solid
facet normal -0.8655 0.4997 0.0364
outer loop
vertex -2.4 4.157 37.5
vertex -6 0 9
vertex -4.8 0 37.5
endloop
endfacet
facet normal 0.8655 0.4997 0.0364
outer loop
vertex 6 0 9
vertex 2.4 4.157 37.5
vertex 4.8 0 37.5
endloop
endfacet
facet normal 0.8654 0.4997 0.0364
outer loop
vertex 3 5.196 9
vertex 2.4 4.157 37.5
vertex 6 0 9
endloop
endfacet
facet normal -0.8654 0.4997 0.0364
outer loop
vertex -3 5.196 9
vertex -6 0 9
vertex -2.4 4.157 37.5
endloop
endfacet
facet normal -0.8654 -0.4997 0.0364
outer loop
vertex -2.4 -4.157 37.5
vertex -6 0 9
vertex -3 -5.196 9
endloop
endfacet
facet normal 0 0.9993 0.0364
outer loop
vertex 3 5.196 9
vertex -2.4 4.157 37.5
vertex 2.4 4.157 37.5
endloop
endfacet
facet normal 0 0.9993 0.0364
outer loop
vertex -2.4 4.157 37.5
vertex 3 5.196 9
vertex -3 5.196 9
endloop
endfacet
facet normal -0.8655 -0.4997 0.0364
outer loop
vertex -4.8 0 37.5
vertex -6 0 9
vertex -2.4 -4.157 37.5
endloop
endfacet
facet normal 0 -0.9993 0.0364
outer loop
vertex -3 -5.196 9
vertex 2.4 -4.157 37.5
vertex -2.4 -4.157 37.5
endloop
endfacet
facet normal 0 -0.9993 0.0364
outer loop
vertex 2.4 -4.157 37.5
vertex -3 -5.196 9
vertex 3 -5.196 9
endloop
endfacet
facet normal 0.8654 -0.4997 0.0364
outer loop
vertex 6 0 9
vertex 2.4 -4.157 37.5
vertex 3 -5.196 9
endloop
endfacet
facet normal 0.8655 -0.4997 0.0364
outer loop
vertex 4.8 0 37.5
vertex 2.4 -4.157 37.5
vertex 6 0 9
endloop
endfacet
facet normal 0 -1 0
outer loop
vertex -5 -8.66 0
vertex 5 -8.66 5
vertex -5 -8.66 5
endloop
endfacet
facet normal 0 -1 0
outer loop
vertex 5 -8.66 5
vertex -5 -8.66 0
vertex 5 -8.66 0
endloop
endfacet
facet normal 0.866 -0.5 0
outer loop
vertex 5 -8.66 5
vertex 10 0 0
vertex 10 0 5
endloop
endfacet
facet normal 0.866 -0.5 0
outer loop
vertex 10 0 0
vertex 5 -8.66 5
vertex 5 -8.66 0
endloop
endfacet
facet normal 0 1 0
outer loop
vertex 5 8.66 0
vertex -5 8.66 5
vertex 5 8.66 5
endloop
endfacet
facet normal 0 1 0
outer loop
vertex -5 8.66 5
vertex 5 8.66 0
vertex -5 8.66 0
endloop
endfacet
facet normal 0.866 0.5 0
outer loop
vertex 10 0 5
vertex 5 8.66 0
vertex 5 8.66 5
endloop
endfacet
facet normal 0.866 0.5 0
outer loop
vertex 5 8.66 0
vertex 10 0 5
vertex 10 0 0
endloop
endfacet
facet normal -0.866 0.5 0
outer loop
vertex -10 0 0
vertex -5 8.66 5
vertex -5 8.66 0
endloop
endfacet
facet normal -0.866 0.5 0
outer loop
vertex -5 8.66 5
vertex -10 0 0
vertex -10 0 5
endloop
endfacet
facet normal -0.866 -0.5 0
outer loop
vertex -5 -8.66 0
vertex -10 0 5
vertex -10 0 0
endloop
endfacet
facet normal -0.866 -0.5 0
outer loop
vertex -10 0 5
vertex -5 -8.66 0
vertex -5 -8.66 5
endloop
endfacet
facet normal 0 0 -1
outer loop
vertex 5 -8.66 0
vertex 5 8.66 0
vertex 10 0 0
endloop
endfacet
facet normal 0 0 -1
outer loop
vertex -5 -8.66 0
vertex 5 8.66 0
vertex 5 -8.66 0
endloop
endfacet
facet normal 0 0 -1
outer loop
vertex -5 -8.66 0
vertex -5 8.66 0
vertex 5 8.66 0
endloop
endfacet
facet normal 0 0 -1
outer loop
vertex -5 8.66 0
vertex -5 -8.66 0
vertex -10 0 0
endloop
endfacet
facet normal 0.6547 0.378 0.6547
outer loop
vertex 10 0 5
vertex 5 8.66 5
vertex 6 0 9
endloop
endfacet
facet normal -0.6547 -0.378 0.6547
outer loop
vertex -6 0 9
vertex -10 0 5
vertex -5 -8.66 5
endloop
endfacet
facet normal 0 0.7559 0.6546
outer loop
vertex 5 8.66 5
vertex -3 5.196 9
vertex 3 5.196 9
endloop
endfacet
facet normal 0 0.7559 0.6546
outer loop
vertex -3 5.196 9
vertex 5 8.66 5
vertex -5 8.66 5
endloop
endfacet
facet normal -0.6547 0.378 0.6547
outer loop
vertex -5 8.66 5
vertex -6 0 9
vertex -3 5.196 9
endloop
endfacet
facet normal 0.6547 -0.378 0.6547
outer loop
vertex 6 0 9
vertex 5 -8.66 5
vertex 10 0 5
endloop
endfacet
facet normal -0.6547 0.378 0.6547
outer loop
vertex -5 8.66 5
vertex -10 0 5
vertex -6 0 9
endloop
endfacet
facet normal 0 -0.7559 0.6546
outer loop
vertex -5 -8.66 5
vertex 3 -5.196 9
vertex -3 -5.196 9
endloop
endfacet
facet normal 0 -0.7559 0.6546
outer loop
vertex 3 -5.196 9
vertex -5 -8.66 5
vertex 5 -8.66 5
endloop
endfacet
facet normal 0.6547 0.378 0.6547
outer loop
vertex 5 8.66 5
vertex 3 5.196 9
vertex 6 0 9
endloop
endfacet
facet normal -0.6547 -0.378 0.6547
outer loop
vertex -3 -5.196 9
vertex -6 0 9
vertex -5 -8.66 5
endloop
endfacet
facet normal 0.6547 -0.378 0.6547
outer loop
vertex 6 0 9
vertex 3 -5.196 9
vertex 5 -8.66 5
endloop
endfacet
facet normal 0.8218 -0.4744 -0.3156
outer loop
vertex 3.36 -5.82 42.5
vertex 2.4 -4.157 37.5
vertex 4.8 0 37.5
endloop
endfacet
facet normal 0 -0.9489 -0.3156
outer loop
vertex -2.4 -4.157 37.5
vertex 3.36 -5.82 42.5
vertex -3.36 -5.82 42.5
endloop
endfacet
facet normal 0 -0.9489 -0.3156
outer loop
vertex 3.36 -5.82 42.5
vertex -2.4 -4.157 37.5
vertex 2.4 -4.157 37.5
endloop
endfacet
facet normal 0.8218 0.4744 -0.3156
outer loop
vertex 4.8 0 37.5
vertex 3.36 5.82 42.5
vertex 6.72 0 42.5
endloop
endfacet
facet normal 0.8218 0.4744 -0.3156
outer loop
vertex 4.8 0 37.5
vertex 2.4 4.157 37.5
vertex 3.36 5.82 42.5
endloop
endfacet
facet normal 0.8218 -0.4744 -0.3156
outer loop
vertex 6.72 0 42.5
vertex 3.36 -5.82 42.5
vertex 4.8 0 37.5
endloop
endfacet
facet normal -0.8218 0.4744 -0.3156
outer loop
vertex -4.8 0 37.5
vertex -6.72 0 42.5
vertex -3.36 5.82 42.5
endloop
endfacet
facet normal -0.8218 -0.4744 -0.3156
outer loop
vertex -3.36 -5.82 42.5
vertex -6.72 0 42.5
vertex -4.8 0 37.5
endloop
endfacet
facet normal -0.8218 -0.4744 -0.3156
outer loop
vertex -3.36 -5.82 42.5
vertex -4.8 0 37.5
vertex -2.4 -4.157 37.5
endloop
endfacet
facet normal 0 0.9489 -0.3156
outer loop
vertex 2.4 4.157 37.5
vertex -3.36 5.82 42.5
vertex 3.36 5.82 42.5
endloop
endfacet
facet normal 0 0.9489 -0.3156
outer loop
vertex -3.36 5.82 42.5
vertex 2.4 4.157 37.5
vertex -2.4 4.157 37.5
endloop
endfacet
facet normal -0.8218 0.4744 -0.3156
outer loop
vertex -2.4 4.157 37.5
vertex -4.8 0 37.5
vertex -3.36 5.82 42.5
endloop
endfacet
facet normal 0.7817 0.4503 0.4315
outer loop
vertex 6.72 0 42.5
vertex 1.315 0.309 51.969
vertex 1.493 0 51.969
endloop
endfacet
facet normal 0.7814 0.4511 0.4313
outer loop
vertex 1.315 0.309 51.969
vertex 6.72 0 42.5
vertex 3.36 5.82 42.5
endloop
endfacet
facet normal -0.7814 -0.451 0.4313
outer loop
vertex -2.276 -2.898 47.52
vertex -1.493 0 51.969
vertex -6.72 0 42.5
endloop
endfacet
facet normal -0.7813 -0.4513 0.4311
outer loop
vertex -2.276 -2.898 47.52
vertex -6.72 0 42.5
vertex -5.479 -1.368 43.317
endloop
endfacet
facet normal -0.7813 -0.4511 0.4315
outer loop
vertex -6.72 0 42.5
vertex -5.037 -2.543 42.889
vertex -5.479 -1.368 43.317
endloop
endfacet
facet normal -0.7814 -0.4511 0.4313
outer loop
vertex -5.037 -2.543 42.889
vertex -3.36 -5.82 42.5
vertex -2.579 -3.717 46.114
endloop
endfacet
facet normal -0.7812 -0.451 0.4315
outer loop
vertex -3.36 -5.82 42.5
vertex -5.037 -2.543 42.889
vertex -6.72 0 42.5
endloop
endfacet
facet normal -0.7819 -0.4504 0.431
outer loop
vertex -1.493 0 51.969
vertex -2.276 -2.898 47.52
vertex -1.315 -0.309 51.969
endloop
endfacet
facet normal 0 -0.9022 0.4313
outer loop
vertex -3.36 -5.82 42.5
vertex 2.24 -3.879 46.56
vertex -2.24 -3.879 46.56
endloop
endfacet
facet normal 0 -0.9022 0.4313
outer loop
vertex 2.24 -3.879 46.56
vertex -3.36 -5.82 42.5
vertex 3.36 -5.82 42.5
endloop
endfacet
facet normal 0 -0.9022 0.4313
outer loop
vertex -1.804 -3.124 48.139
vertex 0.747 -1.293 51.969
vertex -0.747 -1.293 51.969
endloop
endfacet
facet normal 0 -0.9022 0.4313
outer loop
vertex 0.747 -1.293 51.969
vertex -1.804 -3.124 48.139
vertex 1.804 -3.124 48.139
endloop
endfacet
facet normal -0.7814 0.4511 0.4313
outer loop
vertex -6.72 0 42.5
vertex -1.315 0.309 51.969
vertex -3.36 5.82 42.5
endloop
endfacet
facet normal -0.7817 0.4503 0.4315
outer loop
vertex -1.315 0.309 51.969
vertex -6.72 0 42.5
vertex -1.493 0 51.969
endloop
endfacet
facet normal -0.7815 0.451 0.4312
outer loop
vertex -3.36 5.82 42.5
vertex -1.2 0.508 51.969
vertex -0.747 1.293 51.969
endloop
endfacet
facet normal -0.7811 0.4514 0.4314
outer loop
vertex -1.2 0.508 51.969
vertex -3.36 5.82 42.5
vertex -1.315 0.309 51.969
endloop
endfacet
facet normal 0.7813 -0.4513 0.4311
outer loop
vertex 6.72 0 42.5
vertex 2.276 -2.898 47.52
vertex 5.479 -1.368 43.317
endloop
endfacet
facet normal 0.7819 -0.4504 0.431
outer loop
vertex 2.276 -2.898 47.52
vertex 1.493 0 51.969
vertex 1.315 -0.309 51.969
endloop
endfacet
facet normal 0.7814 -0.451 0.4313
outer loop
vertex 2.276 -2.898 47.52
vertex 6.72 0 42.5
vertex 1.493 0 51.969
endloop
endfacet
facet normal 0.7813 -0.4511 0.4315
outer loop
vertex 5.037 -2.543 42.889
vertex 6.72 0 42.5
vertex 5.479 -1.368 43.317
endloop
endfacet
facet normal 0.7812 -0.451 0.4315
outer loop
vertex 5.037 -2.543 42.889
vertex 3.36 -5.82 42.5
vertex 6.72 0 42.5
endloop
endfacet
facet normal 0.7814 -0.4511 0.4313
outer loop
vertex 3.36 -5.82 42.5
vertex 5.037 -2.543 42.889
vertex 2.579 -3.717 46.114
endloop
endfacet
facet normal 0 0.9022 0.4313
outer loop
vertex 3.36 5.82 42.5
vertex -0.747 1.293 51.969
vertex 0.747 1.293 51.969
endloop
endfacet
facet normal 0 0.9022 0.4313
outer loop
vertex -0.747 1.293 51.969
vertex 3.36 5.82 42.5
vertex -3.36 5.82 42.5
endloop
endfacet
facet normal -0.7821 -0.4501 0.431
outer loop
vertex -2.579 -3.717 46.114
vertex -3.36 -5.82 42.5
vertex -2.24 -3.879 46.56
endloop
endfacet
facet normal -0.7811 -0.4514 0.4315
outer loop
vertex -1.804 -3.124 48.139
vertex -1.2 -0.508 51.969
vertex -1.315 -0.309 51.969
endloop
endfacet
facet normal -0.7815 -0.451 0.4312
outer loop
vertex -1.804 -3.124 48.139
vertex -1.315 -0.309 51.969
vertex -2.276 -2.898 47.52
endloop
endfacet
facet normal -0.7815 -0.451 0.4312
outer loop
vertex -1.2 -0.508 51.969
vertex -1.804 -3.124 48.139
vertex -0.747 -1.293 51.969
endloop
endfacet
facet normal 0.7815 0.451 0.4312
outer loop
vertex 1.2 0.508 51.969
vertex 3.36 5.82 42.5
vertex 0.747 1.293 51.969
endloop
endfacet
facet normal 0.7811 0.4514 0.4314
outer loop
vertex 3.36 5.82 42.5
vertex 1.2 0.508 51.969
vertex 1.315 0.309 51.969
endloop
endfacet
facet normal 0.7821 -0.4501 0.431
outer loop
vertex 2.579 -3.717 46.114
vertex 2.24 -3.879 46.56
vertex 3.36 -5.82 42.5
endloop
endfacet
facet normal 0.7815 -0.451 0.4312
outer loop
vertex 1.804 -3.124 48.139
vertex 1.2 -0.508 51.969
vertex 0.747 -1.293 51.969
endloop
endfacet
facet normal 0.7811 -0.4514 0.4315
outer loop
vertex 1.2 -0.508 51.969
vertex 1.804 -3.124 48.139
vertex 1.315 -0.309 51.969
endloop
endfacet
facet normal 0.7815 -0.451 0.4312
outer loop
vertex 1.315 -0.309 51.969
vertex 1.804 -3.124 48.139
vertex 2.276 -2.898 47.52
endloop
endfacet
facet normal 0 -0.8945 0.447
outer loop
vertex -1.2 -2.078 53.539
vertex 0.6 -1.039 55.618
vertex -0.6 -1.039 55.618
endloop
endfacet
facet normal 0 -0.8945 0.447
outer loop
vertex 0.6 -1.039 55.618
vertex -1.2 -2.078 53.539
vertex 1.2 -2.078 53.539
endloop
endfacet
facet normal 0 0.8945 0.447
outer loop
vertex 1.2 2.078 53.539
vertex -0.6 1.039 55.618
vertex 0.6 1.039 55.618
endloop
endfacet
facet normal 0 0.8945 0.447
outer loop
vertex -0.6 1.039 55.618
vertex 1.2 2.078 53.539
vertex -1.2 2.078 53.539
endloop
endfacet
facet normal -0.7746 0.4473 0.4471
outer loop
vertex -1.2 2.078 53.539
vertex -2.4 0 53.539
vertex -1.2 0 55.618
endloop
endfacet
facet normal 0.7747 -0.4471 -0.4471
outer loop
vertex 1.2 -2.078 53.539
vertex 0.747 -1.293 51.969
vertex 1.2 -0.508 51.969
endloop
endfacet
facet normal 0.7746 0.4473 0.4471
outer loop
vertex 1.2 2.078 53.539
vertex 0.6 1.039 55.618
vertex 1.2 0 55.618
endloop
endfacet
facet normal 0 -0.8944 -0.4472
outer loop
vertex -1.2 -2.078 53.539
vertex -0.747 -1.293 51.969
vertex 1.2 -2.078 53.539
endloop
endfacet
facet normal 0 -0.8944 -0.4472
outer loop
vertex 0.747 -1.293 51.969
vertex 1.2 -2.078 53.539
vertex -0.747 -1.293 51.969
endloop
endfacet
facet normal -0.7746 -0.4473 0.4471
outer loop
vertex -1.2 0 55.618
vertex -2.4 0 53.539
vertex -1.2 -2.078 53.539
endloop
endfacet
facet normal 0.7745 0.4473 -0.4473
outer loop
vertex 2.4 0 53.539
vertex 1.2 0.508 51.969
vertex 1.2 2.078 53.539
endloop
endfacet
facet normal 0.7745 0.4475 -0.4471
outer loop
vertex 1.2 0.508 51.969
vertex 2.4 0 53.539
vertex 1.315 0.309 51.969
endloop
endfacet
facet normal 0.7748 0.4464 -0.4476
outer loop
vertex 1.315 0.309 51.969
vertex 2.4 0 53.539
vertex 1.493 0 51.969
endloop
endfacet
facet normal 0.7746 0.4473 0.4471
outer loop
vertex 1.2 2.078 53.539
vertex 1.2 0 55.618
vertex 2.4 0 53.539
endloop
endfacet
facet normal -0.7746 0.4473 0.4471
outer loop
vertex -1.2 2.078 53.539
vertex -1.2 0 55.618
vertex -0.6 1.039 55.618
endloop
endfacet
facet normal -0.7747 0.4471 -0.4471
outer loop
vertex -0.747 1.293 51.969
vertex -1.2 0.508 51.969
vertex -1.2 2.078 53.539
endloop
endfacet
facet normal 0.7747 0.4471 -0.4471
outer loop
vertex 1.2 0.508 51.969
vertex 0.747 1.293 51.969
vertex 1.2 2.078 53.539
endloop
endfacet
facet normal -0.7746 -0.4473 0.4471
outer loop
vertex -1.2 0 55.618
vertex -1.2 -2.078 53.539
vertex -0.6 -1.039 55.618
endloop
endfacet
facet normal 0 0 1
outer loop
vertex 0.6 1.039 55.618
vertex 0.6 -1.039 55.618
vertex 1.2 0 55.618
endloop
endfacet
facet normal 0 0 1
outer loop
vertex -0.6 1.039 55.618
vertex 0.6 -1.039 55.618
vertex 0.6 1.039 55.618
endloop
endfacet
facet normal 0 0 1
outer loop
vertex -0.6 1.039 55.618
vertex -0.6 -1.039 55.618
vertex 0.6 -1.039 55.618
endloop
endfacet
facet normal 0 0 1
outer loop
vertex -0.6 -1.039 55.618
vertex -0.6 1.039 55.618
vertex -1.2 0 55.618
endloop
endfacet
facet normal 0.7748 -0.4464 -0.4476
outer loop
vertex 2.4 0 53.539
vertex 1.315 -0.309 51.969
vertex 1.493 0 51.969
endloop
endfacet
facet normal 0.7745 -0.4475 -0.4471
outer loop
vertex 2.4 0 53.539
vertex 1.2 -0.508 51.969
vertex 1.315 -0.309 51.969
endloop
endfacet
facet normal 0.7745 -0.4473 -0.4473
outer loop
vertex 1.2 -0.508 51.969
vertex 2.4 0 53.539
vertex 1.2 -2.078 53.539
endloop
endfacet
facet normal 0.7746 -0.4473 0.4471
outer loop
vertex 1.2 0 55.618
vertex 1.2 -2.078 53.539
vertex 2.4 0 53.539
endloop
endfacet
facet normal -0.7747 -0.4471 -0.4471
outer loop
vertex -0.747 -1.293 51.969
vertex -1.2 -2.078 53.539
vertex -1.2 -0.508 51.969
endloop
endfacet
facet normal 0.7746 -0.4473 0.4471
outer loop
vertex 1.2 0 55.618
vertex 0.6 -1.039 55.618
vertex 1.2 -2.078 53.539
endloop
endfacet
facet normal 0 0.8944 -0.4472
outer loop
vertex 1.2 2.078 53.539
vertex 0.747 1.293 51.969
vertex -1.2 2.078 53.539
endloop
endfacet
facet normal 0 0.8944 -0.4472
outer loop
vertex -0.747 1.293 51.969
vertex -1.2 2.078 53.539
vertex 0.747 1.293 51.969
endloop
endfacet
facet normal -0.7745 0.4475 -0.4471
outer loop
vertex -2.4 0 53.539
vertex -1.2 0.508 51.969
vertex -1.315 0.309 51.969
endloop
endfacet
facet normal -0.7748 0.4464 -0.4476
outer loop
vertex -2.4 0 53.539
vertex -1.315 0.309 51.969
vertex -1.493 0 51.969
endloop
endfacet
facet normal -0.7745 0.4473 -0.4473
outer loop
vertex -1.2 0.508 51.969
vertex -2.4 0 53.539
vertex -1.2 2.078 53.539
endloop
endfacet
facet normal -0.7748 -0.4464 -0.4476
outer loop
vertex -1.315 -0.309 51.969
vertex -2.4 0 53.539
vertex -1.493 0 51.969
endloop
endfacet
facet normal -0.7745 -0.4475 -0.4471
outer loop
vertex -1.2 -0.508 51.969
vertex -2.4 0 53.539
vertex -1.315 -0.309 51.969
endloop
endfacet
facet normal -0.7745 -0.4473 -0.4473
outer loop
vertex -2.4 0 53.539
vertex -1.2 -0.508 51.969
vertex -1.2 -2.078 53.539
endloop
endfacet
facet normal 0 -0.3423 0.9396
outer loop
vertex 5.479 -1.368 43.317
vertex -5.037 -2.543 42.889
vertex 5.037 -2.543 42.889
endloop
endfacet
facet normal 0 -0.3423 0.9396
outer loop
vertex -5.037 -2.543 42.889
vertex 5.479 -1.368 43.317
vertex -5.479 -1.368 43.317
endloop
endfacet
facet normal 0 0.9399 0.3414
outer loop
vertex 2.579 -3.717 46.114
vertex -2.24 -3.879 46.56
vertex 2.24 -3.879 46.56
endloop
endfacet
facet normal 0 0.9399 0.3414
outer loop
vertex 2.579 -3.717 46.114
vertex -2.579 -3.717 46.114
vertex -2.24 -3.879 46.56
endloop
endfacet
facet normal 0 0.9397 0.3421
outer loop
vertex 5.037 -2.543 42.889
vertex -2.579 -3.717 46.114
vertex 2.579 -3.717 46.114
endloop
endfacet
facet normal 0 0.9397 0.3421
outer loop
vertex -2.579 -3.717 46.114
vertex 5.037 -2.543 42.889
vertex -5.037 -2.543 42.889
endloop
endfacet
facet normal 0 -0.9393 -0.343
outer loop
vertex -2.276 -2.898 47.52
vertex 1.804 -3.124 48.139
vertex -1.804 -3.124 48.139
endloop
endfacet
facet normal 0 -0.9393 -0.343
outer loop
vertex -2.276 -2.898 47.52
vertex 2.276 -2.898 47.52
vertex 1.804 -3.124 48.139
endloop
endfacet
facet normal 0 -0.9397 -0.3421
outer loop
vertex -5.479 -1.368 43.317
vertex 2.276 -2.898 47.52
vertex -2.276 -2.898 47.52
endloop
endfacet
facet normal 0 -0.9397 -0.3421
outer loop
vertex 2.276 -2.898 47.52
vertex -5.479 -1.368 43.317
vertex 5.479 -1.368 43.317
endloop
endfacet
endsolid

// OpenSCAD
// file: piece_base.scad
include <config.scad>;

module piece_base(height,top_diam){
	union(){
		translate([0,0,base_height+(base_diam-piece_diam)/2])
		cylinder(r1=piece_diam/2,r2=top_diam/2,h=height-base_height-(base_diam-piece_diam)/2);
		cylinder(r=base_diam/2,h=base_height);
		translate([0,0,base_height])
			cylinder(r1=base_diam/2,
						r2=piece_diam/2,
						h=(base_diam-piece_diam)/2);
	}
}

piece_base(pawn_height,piece_diam*0.6);
// file: config.scad
piece_diam = 12;
base_diam = 20;
base_height = 5;
pawn_height = 25;


$fn=6;
// main file
include <config.scad>;
use <piece_base.scad>;

bishop_height = pawn_height*1.5;
cross_radius = piece_diam/3.5;
miter_diam = piece_diam*0.8*1.4;
miter_height = base_height*3;
miter_ratio = 2;
ball_size = piece_diam/5;
cut_width = base_height*0.25;
cut_angle = 20;

miter_base_height = miter_height/(1+miter_ratio);

module bishop(){
	difference(){
		union(){
			piece_base(bishop_height,piece_diam*0.8);
			translate([0,0,bishop_height]){
				cylinder(r1 = piece_diam*0.8/2,
					r2 = miter_diam/2,
					h = miter_base_height);
				translate([0,0,miter_base_height])
					cylinder(r1=miter_diam/2,
						r2=ball_size/2,
						h = miter_height - miter_base_height);
				translate([0,0,miter_height+ball_size*cos(30)/2])
					sphere(r=ball_size);
			}
		}
		translate([0,-0.8*miter_diam/2,bishop_height+miter_height])
			rotate([cut_angle,0,0])
				cube([40,cut_width,20],center=true);
	}
}
bishop();
